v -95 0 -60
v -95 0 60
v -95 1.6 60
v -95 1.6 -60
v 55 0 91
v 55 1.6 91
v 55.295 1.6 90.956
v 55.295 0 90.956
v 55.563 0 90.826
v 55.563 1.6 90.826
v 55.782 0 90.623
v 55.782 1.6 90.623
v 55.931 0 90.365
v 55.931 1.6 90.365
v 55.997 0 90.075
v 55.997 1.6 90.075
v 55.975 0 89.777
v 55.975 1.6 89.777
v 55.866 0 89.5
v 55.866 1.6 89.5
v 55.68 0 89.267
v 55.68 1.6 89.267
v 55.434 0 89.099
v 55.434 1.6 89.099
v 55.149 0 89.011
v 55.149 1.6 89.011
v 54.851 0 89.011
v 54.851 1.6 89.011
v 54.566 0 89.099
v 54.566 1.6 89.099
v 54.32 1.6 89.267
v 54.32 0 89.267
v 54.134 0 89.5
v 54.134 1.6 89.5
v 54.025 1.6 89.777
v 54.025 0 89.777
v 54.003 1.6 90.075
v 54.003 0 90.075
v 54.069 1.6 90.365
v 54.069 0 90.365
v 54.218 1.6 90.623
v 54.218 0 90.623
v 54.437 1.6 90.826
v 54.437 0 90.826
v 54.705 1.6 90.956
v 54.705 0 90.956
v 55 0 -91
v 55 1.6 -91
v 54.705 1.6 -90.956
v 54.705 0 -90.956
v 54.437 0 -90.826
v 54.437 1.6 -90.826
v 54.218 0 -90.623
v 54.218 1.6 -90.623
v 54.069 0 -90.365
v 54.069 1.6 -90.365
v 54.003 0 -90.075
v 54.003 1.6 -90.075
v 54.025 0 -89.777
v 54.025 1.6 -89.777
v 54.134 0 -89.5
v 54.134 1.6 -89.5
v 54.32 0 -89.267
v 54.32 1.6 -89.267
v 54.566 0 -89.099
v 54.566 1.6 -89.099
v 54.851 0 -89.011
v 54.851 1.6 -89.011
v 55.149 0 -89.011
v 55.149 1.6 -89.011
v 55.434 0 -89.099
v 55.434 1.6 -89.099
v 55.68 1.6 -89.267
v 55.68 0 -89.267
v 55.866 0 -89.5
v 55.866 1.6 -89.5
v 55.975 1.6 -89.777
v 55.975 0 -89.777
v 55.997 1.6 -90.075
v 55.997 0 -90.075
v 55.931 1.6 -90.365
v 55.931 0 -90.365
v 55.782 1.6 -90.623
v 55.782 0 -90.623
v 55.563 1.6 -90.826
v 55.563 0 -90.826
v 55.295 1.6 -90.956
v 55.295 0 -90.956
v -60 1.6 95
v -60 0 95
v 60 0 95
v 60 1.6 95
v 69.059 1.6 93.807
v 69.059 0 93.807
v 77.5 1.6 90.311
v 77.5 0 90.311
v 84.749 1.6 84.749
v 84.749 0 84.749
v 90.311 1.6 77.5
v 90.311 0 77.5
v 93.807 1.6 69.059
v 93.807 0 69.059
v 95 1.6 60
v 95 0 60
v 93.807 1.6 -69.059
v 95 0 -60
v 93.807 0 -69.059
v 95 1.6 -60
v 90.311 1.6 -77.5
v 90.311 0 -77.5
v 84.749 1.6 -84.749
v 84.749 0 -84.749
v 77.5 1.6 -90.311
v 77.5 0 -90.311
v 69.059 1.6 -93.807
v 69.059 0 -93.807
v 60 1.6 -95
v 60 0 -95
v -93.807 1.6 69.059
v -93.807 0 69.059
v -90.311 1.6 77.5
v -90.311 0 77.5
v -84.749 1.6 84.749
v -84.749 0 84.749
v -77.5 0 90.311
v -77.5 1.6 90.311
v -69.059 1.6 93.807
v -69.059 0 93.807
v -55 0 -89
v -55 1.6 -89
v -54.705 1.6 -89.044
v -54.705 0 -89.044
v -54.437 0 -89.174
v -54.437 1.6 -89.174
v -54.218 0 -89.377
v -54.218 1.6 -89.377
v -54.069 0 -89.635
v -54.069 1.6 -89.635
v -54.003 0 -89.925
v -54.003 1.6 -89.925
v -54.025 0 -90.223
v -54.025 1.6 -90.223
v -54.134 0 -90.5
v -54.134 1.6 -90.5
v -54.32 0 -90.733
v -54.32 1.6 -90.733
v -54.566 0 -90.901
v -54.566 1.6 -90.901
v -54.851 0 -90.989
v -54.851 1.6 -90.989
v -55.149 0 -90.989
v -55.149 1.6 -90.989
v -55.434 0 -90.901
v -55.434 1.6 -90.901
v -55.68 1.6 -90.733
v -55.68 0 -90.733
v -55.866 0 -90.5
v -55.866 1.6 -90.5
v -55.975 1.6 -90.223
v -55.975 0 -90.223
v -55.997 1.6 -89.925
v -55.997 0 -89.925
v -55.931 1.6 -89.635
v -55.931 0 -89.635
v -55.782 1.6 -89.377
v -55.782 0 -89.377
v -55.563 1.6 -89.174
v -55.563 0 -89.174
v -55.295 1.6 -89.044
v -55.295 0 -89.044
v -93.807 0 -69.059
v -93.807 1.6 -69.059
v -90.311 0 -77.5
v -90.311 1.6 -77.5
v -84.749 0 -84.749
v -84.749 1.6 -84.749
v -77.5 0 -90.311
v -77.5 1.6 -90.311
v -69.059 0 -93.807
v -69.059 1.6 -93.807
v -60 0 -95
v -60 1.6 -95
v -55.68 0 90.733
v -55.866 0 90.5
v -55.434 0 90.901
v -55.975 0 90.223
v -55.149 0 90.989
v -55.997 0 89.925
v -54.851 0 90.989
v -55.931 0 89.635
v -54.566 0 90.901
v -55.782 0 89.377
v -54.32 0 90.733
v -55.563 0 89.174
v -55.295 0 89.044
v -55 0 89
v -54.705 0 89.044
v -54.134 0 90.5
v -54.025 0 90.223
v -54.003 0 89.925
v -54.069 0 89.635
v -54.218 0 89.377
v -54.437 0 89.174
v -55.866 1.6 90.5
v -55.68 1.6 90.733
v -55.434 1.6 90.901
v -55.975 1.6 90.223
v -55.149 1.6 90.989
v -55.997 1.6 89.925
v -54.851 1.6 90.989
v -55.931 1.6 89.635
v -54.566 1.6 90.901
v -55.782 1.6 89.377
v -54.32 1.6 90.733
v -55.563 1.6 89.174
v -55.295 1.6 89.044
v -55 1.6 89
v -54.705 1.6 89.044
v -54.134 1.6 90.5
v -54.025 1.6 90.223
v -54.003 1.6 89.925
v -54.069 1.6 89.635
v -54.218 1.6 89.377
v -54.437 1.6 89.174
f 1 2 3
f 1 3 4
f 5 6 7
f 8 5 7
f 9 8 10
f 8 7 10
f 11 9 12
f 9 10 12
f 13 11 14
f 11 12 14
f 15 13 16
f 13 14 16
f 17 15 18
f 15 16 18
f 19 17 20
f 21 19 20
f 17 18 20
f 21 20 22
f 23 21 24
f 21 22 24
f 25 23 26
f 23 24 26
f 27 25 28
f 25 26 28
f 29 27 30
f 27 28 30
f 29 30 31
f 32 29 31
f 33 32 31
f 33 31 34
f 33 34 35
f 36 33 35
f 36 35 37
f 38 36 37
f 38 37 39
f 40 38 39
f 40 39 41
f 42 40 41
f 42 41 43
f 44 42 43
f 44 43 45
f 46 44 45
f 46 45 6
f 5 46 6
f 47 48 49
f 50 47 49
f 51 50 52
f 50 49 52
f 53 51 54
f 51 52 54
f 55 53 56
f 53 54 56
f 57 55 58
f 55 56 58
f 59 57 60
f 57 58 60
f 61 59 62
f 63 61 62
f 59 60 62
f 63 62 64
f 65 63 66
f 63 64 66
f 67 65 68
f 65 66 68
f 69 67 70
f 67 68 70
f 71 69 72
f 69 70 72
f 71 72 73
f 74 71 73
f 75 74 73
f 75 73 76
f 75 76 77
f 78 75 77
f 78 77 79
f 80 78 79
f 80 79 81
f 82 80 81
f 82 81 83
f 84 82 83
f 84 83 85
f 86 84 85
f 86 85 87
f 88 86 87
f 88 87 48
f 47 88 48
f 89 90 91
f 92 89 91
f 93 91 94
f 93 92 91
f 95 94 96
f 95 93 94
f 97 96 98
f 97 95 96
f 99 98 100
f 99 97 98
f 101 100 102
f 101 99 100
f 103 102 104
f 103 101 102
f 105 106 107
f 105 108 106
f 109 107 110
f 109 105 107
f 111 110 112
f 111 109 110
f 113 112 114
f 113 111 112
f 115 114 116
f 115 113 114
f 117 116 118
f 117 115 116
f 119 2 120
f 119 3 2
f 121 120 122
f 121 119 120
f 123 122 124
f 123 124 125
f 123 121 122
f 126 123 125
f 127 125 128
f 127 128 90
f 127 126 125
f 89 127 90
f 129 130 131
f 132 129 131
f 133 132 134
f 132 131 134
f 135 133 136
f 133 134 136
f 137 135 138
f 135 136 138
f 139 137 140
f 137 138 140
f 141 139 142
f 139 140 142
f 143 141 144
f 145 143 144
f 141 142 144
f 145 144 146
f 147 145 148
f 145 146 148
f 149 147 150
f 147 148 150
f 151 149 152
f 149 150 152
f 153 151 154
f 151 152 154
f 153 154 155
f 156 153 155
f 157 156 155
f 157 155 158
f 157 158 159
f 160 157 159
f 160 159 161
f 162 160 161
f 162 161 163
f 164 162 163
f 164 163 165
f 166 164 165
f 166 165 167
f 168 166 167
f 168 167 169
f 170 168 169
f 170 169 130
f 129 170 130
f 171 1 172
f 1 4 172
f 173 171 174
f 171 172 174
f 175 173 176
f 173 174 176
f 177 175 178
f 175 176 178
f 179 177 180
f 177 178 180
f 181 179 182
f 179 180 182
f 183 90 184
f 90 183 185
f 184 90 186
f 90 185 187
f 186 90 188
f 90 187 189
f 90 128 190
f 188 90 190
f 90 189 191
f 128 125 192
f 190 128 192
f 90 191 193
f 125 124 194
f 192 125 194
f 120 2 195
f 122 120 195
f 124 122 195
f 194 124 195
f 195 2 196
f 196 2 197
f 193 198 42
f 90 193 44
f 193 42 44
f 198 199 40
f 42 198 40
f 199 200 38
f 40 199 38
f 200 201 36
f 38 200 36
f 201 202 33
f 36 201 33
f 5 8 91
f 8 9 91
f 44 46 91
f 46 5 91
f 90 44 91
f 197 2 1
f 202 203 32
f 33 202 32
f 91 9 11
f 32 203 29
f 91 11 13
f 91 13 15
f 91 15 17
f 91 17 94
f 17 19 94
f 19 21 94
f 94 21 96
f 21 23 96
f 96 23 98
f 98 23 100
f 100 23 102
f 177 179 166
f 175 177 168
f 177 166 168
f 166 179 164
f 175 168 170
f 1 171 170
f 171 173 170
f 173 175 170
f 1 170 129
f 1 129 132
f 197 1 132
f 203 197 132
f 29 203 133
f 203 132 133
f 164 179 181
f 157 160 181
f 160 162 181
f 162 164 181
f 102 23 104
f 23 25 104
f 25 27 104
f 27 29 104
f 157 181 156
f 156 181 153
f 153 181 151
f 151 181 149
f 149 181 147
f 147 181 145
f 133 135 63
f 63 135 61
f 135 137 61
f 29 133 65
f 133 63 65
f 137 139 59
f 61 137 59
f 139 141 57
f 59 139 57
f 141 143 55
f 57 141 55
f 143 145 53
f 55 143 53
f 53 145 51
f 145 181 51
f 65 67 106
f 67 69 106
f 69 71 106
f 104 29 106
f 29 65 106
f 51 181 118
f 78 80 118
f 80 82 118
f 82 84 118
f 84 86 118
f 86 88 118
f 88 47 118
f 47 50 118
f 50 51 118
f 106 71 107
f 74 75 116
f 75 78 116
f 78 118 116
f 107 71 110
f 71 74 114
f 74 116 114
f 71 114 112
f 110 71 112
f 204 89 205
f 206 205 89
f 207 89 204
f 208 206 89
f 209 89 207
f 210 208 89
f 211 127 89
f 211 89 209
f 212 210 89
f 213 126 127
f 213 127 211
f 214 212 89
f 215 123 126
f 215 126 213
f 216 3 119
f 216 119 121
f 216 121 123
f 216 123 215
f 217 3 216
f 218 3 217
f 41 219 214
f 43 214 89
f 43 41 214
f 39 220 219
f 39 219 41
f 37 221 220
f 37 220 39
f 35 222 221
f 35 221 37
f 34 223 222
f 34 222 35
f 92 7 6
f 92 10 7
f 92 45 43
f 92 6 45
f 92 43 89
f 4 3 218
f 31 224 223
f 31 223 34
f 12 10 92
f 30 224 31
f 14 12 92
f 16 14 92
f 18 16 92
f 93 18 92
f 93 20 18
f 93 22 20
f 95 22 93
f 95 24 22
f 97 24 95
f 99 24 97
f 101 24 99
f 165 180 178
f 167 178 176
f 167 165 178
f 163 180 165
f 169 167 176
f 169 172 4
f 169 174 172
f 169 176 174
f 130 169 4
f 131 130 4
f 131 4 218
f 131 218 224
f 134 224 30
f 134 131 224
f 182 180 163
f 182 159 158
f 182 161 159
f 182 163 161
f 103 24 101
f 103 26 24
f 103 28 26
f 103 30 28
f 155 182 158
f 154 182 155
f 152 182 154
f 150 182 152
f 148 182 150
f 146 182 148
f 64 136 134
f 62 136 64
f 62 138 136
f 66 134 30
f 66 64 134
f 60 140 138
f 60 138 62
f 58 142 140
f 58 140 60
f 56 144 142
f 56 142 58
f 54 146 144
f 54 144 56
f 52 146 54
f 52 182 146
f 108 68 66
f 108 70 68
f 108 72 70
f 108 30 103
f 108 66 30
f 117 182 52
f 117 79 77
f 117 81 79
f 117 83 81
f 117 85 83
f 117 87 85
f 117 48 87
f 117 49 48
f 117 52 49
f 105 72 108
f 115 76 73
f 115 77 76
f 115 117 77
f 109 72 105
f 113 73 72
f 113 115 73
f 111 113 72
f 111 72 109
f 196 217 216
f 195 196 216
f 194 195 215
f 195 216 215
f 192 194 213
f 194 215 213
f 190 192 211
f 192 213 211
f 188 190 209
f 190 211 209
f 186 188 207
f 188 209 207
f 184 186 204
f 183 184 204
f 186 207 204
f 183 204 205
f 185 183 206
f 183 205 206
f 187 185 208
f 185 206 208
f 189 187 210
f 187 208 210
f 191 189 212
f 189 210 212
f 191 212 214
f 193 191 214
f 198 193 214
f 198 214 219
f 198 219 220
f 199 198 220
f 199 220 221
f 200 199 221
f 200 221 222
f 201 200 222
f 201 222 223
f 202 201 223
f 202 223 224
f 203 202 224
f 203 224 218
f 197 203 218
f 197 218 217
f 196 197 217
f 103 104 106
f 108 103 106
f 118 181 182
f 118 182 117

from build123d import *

# Parameters (mm, degrees)
ESBO_O1_W                = 190
ESBO_O1_H                = 190
RESSALTO_EXTRUS_O1_DEPTH = 1.6
FILETE1_R                = 35
ESBO_O2_R                = 1
CORTE_EXTRUS_O1_DEPTH    = 135.359815421


with BuildPart() as part:
    # Esboço1 → Ressalto-extrusão1 (new body)
    with BuildSketch(Plane(origin=(0, 0, 0), x_dir=(1, 0, 0), z_dir=(0, 1, 0))):
        Rectangle(ESBO_O1_W, ESBO_O1_H)
    extrude(amount=RESSALTO_EXTRUS_O1_DEPTH)

    # Filete1
    filete1_edges = [part.edges().sort_by_distance(p)[0] for p in [
        (95, 0.8, 95),
        (-95, 0.8, 95),
        (-95, 0.8, -95),
        (95, 0.8, -95),
    ]]
    fillet(filete1_edges, radius=FILETE1_R)

    # Esboço2 → Corte-extrusão1 (cut, through all)
    with BuildSketch(Plane(origin=(0, 1.6, 0), x_dir=(1, 0, 0), z_dir=(0, 1, 0))):
        with Locations(Location((-55, 90, 0), (0, 0, 270))):
            Circle(ESBO_O2_R)
        with Locations(Location((55, 90, 0), (0, 0, 90))):
            Circle(ESBO_O2_R)
        with Locations(Location((55, -90, 0), (0, 0, 270))):
            Circle(ESBO_O2_R)
        with Locations(Location((-55, -90, 0), (0, 0, 90))):
            Circle(ESBO_O2_R)
    extrude(amount=-CORTE_EXTRUS_O1_DEPTH, mode=Mode.SUBTRACT)


solid = part.part
